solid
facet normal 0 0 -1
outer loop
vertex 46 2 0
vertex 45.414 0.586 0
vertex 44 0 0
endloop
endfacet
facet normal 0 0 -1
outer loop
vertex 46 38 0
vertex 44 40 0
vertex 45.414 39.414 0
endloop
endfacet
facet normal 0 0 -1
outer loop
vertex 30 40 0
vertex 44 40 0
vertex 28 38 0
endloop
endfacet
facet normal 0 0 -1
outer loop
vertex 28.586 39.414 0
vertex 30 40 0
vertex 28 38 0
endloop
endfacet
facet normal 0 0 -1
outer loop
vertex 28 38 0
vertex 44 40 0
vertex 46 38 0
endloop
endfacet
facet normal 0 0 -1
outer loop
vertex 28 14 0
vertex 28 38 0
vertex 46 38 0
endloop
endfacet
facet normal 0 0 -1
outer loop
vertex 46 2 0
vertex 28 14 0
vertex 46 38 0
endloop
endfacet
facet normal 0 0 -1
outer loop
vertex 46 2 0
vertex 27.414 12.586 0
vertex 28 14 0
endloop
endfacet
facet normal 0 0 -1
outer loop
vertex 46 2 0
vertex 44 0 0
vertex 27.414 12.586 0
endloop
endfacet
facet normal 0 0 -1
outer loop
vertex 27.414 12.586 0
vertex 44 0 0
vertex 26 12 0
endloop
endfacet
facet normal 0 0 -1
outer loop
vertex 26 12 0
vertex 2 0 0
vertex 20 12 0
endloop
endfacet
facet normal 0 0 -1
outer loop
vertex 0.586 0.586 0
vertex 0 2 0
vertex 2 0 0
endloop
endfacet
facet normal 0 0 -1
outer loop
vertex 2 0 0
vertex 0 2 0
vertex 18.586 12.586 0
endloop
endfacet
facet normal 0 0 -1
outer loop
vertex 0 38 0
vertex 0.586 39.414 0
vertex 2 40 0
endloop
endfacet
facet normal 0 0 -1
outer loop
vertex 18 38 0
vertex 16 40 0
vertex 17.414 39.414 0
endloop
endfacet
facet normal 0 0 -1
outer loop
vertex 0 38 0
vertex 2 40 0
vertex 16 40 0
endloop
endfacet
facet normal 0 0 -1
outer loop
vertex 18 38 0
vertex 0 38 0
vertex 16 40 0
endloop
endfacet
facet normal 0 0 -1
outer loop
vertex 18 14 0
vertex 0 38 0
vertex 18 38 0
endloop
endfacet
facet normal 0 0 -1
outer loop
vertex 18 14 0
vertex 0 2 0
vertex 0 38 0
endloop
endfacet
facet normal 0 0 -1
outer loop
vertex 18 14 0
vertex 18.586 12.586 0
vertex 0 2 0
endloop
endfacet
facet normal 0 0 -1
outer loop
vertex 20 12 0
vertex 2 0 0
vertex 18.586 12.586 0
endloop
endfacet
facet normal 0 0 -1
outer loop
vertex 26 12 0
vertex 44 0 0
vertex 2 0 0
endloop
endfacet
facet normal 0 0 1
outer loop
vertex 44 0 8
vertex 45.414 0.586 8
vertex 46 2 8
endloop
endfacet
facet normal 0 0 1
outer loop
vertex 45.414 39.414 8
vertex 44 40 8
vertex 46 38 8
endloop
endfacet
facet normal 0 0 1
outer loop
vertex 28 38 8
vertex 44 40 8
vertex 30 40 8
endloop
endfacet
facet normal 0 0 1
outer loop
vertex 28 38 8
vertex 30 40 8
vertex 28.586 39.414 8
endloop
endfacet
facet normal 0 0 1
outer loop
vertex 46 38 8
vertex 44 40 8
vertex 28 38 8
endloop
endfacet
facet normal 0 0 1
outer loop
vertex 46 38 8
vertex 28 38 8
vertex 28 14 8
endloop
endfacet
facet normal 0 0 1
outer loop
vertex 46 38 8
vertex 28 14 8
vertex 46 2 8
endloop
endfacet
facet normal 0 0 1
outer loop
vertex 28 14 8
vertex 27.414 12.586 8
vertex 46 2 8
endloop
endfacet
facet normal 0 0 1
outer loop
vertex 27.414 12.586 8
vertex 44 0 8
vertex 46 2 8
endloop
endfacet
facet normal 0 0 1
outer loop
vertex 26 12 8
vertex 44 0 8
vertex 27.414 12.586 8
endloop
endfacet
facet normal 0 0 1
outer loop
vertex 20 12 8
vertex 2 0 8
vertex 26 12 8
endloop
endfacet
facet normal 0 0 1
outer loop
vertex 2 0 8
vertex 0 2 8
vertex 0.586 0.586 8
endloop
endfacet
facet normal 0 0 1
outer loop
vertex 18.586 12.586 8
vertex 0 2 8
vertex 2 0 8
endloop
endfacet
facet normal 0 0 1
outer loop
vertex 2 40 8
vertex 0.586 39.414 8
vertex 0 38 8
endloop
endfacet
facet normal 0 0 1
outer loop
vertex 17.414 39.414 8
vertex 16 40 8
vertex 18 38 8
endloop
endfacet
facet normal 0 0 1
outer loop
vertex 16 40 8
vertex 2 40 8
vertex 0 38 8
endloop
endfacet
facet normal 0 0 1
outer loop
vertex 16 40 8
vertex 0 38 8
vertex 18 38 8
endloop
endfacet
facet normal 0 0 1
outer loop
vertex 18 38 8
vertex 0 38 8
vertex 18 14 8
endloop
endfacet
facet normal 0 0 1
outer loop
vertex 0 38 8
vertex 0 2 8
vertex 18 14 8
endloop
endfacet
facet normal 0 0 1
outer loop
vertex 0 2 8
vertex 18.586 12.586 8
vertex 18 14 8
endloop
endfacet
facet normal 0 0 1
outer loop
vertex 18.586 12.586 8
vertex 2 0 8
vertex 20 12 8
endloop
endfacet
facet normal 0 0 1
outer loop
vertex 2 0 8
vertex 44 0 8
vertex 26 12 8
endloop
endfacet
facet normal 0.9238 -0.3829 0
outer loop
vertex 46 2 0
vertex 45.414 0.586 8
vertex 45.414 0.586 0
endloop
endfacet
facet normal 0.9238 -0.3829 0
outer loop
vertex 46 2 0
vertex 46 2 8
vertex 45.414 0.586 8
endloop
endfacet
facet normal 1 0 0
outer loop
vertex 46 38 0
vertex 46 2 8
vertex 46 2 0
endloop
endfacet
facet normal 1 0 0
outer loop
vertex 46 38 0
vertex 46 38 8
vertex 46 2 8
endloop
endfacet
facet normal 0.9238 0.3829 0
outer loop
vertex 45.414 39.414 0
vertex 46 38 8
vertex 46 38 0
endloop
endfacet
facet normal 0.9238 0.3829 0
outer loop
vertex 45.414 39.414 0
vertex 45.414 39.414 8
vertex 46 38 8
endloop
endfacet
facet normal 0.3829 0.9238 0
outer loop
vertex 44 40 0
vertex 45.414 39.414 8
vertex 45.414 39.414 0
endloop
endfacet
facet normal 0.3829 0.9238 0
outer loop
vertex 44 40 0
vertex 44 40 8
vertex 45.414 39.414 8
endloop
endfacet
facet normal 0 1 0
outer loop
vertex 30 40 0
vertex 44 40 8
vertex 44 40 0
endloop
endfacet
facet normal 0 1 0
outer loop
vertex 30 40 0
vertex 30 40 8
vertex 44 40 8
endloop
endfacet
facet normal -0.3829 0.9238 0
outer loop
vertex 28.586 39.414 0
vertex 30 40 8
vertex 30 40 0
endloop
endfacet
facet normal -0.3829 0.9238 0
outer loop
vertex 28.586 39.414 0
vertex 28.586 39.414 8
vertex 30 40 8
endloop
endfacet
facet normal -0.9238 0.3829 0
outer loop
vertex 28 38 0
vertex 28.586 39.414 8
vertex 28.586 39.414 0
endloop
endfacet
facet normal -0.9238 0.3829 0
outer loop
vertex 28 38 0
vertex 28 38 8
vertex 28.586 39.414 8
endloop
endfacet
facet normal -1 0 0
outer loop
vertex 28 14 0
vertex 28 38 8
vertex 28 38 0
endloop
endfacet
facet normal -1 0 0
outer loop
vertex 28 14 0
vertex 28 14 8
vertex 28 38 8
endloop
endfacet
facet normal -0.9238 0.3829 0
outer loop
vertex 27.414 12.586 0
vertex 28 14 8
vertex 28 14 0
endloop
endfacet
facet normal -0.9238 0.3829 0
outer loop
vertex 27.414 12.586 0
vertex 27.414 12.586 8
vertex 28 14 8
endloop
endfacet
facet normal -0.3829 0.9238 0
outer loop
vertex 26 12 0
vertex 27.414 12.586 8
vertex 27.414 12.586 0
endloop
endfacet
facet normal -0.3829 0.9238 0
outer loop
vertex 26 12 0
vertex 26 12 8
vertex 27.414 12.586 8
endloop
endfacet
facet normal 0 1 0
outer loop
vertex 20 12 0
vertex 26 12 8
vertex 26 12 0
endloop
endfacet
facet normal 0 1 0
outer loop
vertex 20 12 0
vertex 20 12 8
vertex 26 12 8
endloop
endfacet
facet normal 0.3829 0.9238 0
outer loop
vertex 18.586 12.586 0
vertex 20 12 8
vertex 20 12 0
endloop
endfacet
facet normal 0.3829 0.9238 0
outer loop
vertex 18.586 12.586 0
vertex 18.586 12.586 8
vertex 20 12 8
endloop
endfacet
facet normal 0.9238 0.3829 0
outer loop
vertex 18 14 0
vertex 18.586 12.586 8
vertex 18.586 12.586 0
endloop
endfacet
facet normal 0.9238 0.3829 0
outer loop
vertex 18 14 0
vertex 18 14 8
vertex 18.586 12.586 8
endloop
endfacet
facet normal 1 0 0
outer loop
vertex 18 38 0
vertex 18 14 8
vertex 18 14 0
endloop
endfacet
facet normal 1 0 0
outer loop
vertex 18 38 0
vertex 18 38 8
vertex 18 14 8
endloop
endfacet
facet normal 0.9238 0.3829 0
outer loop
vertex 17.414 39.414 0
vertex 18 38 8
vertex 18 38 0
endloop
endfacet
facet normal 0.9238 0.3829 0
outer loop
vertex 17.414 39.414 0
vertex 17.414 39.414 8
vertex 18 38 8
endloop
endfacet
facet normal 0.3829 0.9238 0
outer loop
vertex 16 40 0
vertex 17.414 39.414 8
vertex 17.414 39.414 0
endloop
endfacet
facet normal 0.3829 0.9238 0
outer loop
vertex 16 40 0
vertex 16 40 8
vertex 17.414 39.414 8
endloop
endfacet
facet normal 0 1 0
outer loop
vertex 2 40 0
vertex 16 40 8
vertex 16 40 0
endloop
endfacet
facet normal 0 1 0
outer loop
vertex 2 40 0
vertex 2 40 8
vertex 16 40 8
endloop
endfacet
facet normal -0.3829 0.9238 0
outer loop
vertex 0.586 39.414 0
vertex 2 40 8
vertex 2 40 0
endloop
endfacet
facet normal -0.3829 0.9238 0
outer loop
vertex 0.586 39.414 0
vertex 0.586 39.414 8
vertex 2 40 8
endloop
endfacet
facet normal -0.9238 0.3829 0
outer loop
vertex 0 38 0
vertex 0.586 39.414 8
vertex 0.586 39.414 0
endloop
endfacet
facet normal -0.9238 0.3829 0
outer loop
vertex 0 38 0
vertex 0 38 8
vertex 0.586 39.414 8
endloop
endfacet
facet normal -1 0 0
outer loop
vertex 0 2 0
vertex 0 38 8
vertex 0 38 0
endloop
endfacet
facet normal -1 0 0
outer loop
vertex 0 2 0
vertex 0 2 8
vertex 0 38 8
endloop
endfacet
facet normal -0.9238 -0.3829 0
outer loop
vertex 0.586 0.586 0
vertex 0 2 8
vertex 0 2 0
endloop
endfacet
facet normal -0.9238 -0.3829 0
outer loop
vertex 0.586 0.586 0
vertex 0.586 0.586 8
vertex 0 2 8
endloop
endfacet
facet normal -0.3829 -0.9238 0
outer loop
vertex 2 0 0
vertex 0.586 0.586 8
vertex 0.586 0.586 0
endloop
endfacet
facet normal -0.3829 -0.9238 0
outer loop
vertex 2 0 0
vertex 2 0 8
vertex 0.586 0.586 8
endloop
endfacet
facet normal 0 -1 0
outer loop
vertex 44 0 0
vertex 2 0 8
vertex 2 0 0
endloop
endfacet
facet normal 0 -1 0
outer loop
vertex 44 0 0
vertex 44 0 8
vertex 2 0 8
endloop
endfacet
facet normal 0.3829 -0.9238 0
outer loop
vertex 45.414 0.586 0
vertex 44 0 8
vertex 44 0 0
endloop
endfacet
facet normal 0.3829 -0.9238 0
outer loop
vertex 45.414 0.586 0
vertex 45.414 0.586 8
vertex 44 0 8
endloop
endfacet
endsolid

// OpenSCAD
$fn = 32;

// ----------------------------------------------------------------------
// Eye lug: clevis, 8 mm thick
// ----------------------------------------------------------------------

// --- parameters (mm) ---
profile_height = 8;       // extrusion height
profile_points = 24;      // points of the closed outline

profile = [[0, 2], [0.586, 0.586], [2, 0], [44, 0], [45.414, 0.586], [46, 2], [46, 38], [45.414, 39.414], [44, 40], [30, 40], [28.586, 39.414], [28, 38], [28, 14], [27.414, 12.586], [26, 12], [20, 12], [18.586, 12.586], [18, 14], [18, 38], [17.414, 39.414], [16, 40], [2, 40], [0.586, 39.414], [0, 38]];  // single closed polygon, 24 points, counter clockwise

// --- the one profile operation ---
linear_extrude(height = profile_height) polygon(points = profile);
